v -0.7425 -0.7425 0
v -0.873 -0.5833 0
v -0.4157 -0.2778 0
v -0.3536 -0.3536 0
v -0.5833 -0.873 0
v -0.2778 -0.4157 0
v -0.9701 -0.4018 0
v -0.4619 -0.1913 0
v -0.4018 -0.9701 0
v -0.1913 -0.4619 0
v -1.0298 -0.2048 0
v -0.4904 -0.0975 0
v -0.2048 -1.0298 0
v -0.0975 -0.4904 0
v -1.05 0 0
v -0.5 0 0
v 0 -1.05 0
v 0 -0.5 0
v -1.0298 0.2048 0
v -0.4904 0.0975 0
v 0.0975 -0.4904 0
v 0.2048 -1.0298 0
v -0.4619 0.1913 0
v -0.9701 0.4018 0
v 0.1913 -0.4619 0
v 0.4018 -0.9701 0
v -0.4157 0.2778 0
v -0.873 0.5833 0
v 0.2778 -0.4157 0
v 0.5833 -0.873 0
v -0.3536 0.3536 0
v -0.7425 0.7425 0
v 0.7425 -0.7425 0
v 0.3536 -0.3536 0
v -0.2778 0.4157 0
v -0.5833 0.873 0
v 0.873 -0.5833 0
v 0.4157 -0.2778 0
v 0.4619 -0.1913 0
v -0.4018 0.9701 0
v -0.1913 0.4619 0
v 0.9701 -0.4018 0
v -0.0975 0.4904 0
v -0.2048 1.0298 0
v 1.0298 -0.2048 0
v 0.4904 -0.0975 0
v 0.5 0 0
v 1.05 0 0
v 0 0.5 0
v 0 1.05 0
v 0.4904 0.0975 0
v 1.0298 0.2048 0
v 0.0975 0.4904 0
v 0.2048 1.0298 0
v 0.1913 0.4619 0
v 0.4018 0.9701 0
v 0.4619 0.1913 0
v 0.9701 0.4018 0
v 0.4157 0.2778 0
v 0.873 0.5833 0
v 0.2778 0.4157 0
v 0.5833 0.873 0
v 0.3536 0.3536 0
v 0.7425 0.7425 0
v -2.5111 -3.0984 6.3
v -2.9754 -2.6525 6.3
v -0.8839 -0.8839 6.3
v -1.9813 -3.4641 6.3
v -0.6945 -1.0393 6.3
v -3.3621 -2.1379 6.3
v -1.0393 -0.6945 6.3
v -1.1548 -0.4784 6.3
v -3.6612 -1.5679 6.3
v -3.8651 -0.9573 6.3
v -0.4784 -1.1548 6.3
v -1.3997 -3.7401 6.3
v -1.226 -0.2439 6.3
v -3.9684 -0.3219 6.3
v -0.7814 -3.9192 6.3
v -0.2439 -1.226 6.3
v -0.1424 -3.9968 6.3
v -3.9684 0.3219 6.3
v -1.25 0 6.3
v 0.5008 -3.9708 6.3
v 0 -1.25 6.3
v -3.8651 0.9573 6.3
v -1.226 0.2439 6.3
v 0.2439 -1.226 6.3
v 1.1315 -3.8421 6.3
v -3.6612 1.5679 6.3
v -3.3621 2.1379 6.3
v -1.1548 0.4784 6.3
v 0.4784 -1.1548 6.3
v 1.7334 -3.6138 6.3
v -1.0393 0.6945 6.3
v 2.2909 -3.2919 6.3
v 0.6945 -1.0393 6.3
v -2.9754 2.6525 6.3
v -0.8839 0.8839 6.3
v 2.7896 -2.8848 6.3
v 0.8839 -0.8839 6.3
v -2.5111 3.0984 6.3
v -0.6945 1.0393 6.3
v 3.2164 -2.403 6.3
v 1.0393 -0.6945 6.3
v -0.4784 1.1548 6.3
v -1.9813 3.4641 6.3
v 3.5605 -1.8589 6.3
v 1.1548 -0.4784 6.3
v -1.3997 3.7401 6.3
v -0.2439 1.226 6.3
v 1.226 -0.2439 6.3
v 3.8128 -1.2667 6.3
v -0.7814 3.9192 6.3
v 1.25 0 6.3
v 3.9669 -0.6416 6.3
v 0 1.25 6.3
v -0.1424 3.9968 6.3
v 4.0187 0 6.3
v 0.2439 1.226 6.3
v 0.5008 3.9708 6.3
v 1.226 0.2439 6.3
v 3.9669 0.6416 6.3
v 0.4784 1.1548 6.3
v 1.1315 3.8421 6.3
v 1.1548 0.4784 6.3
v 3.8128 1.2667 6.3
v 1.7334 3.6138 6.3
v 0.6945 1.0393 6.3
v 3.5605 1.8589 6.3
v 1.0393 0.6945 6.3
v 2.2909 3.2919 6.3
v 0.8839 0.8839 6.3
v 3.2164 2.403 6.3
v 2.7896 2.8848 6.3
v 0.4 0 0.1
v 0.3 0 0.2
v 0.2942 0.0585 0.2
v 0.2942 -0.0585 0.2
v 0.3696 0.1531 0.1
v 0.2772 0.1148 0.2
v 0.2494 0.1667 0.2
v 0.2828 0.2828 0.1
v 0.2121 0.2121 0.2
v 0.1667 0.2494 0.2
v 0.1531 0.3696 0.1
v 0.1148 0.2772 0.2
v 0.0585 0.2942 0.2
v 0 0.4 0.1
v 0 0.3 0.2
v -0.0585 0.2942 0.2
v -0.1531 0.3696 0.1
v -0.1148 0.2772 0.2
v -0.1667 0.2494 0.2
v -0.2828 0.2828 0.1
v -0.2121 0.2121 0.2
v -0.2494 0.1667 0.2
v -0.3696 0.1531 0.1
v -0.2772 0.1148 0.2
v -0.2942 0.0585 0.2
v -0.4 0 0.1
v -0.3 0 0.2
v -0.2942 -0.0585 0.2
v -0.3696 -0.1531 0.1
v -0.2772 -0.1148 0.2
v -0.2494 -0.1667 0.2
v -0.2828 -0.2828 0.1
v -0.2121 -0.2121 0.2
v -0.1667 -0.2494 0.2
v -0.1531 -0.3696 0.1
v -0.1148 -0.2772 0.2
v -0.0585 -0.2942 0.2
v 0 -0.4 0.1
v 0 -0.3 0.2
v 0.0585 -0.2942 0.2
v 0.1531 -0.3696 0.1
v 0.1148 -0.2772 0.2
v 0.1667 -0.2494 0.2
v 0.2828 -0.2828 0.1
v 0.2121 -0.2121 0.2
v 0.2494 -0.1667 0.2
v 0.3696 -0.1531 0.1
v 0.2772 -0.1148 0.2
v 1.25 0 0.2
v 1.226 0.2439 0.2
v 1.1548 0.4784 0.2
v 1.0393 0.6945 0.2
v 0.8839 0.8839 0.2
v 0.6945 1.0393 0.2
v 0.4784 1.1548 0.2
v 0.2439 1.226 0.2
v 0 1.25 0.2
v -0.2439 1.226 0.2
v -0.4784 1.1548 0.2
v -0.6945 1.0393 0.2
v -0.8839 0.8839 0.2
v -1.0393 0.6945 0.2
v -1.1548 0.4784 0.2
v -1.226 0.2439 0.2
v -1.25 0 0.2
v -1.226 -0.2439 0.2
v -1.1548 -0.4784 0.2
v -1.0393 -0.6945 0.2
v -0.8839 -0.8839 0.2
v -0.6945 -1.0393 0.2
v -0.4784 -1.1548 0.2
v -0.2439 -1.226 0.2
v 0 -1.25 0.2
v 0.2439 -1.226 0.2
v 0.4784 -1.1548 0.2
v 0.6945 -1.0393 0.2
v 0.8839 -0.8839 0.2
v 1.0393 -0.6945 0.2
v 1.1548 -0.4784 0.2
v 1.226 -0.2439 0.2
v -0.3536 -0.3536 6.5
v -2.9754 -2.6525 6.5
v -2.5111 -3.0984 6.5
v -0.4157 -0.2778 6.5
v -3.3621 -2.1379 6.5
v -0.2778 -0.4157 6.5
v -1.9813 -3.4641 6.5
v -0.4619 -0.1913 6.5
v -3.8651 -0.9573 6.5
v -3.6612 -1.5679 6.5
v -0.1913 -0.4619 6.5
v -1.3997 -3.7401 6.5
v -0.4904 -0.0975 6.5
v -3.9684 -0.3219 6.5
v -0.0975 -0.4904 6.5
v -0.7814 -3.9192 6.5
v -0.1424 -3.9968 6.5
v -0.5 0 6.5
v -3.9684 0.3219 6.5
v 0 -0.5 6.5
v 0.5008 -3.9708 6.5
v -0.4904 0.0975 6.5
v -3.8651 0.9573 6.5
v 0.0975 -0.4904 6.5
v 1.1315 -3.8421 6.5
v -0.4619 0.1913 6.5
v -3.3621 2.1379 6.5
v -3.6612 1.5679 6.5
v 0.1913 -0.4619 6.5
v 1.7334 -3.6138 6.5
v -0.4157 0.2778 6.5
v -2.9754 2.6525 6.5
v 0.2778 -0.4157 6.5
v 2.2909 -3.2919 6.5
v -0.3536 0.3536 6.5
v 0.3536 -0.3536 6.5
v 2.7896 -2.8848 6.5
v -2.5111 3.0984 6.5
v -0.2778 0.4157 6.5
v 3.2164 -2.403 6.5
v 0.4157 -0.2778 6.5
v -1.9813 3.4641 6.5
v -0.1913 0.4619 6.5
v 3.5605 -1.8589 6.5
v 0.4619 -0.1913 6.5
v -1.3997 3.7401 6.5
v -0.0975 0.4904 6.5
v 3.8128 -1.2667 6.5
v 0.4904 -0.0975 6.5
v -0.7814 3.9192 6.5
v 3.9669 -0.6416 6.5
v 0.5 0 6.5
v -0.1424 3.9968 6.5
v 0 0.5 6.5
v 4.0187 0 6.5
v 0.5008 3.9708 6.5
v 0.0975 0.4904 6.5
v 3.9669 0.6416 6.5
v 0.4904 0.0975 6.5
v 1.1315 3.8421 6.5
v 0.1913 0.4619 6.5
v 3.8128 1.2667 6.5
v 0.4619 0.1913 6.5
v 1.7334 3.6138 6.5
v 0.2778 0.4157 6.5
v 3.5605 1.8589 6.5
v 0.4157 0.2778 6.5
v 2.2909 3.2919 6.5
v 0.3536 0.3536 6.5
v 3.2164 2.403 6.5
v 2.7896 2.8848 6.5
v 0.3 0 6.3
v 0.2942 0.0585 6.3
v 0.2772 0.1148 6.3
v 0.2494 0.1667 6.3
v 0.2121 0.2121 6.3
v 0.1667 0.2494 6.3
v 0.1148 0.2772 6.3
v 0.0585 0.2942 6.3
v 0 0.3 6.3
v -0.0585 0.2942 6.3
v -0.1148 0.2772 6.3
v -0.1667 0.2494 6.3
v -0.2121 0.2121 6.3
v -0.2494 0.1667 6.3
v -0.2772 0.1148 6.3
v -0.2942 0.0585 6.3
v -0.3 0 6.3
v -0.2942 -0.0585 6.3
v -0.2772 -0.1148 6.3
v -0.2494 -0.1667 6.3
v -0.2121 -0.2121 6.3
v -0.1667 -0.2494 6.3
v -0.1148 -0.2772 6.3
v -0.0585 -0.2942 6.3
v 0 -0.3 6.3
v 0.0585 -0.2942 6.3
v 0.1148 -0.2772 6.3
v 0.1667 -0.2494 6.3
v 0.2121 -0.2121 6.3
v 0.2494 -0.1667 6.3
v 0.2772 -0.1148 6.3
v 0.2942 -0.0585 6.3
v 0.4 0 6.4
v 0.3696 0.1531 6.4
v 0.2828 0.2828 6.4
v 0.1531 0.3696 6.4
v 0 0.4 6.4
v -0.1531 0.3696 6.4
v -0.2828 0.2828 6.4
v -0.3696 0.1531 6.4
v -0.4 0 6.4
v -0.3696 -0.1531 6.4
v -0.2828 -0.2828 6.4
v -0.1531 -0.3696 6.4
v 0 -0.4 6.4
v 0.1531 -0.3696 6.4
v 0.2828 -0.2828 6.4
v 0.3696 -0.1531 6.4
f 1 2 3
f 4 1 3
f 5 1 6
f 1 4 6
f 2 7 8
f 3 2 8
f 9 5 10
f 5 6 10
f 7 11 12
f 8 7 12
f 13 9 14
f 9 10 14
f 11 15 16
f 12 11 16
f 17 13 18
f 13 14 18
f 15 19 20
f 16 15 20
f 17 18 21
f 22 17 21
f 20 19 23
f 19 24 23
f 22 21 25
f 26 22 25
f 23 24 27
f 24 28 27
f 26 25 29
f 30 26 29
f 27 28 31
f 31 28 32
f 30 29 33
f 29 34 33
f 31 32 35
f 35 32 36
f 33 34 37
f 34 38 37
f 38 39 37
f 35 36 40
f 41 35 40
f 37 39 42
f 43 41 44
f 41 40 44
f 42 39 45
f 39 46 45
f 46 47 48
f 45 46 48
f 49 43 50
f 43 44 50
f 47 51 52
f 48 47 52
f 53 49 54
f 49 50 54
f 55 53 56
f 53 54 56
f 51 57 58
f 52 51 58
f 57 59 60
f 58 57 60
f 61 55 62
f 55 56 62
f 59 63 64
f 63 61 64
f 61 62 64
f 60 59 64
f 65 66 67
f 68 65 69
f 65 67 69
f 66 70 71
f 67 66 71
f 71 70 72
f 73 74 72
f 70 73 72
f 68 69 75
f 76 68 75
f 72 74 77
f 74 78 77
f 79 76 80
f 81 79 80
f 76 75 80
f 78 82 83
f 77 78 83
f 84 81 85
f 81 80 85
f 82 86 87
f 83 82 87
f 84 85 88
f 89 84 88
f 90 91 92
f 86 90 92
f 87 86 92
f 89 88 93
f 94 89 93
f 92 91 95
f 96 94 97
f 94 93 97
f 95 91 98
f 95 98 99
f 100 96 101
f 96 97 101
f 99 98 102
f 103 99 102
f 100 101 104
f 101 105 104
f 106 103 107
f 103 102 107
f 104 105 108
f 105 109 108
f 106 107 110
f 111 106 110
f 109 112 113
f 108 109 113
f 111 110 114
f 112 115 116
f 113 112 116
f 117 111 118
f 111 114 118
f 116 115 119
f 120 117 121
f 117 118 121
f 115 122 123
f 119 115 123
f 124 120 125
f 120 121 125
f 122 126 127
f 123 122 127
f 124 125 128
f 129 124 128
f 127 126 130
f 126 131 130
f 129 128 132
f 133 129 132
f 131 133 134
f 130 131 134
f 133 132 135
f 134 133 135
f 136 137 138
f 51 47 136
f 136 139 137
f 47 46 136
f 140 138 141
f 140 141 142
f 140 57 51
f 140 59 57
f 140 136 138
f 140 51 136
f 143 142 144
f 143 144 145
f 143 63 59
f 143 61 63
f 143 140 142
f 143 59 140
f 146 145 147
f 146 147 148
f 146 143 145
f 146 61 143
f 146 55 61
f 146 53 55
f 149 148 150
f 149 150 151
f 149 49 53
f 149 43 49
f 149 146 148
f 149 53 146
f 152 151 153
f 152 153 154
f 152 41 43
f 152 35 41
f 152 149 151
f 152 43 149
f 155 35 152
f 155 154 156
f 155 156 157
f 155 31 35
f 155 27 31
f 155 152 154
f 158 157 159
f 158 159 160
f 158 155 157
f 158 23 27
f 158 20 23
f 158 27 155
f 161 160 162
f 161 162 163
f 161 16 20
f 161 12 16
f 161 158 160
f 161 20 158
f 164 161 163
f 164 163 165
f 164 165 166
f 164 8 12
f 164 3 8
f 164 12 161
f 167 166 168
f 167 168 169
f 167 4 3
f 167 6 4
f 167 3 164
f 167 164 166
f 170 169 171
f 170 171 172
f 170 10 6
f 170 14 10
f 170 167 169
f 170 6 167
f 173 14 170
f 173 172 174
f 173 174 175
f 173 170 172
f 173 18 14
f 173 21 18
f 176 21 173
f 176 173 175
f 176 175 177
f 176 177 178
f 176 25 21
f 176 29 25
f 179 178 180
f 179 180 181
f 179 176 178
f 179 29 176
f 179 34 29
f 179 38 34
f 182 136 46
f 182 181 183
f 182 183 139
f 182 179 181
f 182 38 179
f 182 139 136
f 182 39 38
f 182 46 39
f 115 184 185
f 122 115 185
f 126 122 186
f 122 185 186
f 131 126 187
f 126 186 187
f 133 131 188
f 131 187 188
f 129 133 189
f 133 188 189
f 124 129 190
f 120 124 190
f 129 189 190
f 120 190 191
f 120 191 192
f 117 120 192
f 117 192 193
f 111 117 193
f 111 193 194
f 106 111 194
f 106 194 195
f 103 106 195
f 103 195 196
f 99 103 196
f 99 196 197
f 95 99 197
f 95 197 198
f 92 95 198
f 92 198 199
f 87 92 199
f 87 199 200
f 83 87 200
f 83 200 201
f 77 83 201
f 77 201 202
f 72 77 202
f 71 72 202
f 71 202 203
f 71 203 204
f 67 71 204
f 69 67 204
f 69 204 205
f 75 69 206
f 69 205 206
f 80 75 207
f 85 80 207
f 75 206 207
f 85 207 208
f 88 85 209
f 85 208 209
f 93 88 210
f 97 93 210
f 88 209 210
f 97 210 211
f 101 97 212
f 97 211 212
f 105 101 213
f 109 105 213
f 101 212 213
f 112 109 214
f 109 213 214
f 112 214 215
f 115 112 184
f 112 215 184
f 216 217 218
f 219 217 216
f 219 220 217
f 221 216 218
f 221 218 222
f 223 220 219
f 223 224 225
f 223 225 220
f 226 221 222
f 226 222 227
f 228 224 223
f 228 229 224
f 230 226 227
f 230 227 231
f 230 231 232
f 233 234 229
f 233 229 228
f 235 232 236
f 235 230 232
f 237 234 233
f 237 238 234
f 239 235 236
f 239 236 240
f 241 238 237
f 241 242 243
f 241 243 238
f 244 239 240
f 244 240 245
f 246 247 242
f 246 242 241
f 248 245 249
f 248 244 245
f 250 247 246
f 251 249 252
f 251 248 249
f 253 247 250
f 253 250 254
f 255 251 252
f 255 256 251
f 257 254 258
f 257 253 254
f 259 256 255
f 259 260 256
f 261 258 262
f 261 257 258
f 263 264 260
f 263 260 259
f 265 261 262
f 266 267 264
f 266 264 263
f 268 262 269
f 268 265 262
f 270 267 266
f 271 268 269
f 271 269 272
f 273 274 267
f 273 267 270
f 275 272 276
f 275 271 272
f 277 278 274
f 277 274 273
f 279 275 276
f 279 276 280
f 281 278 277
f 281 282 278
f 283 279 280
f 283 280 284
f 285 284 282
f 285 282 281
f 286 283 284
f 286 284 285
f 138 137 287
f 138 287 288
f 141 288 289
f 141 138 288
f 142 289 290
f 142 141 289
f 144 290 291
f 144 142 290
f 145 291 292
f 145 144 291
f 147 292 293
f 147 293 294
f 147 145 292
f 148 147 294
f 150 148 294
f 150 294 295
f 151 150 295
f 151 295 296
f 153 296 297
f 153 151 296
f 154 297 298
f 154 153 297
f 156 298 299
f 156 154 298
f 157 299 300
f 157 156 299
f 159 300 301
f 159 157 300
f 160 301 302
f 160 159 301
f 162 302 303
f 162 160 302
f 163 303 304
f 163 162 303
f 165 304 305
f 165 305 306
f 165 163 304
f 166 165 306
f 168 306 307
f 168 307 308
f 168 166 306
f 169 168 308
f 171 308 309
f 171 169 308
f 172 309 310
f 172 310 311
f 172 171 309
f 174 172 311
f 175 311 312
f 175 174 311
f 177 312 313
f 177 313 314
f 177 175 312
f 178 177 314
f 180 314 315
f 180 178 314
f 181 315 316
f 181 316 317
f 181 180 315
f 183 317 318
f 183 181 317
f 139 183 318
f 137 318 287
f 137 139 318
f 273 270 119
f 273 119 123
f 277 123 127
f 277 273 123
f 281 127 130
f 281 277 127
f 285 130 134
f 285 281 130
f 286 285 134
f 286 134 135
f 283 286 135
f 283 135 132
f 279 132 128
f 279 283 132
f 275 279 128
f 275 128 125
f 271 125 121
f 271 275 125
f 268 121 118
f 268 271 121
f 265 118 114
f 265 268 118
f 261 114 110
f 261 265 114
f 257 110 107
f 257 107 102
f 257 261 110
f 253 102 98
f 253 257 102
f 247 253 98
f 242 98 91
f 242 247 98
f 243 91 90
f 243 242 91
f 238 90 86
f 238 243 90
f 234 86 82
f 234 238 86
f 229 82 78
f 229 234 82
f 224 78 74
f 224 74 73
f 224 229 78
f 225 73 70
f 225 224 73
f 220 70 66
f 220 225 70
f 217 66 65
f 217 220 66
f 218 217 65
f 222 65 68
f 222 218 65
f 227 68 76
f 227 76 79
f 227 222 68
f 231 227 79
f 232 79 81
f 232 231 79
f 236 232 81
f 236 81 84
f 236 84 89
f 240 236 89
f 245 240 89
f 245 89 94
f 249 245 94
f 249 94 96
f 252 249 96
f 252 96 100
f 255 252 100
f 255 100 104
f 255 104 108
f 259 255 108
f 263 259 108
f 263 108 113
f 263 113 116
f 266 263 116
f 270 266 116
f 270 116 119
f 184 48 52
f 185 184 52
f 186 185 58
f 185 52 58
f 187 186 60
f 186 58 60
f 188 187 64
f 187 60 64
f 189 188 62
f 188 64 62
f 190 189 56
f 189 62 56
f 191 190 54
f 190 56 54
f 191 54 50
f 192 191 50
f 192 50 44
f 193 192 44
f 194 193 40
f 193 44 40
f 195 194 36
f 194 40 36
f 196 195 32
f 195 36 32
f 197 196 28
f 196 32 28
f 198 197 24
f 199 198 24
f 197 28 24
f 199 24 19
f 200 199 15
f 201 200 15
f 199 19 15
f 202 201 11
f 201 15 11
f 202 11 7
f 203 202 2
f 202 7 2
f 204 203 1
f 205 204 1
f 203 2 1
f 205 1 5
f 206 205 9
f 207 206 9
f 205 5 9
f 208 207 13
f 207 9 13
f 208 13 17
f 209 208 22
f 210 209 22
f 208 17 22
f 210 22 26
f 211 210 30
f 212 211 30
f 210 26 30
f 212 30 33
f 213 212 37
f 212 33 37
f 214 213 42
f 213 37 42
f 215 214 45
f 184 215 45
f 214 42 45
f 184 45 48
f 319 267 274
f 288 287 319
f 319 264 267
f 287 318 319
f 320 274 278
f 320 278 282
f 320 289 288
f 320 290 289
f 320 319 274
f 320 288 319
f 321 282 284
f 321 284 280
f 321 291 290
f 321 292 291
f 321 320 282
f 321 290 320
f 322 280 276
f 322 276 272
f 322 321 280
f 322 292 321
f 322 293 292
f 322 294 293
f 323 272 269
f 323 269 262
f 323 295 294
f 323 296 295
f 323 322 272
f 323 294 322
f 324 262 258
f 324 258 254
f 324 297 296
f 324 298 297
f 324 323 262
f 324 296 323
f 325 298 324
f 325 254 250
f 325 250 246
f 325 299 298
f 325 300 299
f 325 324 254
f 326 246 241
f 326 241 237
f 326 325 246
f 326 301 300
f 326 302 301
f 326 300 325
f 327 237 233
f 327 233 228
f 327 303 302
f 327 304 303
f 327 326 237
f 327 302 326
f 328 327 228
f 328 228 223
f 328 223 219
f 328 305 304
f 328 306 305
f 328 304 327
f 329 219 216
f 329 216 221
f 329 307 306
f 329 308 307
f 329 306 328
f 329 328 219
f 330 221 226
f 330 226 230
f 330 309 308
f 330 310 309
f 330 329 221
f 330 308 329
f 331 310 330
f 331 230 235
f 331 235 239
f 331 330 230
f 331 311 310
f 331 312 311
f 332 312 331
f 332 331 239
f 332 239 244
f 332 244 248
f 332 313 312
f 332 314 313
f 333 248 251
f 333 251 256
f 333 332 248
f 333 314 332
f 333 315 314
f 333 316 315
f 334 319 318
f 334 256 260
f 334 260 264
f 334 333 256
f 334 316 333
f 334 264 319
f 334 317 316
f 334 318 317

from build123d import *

# Parameters (mm, degrees)
SKETCH1_R           = 1.25
SKETCH1_R_2         = 0.3
BOSS_EXTRUDE1_DEPTH = 6.5
SKETCH2_R           = 4
SKETCH2_R_2         = 1.25
BOSS_EXTRUDE2_DEPTH = 0.2
CHAMFER1_SIZE       = 0.2


with BuildPart() as part:
    # Sketch1 → Boss-Extrude1 (new body)
    with BuildSketch(Plane.XY):
        Circle(SKETCH1_R)
        Circle(SKETCH1_R_2, mode=Mode.SUBTRACT)
    extrude(amount=BOSS_EXTRUDE1_DEPTH)

    # Sketch2 → Boss-Extrude2 (add)
    with BuildSketch(Plane.XY.offset(6.5)):
        with Locations((0.018669882, 0)):
            Circle(SKETCH2_R)
        Circle(SKETCH2_R_2, mode=Mode.SUBTRACT)
    extrude(amount=-BOSS_EXTRUDE2_DEPTH)

    # Chamfer1
    chamfer1_edges = [part.edges().sort_by_distance(p)[0] for p in [
        (-1.25, 0, 0),
        (-0.3, 0, 0),
        (-0.3, 0, 6.5),
    ]]
    chamfer(chamfer1_edges, length=CHAMFER1_SIZE)


solid = part.part
